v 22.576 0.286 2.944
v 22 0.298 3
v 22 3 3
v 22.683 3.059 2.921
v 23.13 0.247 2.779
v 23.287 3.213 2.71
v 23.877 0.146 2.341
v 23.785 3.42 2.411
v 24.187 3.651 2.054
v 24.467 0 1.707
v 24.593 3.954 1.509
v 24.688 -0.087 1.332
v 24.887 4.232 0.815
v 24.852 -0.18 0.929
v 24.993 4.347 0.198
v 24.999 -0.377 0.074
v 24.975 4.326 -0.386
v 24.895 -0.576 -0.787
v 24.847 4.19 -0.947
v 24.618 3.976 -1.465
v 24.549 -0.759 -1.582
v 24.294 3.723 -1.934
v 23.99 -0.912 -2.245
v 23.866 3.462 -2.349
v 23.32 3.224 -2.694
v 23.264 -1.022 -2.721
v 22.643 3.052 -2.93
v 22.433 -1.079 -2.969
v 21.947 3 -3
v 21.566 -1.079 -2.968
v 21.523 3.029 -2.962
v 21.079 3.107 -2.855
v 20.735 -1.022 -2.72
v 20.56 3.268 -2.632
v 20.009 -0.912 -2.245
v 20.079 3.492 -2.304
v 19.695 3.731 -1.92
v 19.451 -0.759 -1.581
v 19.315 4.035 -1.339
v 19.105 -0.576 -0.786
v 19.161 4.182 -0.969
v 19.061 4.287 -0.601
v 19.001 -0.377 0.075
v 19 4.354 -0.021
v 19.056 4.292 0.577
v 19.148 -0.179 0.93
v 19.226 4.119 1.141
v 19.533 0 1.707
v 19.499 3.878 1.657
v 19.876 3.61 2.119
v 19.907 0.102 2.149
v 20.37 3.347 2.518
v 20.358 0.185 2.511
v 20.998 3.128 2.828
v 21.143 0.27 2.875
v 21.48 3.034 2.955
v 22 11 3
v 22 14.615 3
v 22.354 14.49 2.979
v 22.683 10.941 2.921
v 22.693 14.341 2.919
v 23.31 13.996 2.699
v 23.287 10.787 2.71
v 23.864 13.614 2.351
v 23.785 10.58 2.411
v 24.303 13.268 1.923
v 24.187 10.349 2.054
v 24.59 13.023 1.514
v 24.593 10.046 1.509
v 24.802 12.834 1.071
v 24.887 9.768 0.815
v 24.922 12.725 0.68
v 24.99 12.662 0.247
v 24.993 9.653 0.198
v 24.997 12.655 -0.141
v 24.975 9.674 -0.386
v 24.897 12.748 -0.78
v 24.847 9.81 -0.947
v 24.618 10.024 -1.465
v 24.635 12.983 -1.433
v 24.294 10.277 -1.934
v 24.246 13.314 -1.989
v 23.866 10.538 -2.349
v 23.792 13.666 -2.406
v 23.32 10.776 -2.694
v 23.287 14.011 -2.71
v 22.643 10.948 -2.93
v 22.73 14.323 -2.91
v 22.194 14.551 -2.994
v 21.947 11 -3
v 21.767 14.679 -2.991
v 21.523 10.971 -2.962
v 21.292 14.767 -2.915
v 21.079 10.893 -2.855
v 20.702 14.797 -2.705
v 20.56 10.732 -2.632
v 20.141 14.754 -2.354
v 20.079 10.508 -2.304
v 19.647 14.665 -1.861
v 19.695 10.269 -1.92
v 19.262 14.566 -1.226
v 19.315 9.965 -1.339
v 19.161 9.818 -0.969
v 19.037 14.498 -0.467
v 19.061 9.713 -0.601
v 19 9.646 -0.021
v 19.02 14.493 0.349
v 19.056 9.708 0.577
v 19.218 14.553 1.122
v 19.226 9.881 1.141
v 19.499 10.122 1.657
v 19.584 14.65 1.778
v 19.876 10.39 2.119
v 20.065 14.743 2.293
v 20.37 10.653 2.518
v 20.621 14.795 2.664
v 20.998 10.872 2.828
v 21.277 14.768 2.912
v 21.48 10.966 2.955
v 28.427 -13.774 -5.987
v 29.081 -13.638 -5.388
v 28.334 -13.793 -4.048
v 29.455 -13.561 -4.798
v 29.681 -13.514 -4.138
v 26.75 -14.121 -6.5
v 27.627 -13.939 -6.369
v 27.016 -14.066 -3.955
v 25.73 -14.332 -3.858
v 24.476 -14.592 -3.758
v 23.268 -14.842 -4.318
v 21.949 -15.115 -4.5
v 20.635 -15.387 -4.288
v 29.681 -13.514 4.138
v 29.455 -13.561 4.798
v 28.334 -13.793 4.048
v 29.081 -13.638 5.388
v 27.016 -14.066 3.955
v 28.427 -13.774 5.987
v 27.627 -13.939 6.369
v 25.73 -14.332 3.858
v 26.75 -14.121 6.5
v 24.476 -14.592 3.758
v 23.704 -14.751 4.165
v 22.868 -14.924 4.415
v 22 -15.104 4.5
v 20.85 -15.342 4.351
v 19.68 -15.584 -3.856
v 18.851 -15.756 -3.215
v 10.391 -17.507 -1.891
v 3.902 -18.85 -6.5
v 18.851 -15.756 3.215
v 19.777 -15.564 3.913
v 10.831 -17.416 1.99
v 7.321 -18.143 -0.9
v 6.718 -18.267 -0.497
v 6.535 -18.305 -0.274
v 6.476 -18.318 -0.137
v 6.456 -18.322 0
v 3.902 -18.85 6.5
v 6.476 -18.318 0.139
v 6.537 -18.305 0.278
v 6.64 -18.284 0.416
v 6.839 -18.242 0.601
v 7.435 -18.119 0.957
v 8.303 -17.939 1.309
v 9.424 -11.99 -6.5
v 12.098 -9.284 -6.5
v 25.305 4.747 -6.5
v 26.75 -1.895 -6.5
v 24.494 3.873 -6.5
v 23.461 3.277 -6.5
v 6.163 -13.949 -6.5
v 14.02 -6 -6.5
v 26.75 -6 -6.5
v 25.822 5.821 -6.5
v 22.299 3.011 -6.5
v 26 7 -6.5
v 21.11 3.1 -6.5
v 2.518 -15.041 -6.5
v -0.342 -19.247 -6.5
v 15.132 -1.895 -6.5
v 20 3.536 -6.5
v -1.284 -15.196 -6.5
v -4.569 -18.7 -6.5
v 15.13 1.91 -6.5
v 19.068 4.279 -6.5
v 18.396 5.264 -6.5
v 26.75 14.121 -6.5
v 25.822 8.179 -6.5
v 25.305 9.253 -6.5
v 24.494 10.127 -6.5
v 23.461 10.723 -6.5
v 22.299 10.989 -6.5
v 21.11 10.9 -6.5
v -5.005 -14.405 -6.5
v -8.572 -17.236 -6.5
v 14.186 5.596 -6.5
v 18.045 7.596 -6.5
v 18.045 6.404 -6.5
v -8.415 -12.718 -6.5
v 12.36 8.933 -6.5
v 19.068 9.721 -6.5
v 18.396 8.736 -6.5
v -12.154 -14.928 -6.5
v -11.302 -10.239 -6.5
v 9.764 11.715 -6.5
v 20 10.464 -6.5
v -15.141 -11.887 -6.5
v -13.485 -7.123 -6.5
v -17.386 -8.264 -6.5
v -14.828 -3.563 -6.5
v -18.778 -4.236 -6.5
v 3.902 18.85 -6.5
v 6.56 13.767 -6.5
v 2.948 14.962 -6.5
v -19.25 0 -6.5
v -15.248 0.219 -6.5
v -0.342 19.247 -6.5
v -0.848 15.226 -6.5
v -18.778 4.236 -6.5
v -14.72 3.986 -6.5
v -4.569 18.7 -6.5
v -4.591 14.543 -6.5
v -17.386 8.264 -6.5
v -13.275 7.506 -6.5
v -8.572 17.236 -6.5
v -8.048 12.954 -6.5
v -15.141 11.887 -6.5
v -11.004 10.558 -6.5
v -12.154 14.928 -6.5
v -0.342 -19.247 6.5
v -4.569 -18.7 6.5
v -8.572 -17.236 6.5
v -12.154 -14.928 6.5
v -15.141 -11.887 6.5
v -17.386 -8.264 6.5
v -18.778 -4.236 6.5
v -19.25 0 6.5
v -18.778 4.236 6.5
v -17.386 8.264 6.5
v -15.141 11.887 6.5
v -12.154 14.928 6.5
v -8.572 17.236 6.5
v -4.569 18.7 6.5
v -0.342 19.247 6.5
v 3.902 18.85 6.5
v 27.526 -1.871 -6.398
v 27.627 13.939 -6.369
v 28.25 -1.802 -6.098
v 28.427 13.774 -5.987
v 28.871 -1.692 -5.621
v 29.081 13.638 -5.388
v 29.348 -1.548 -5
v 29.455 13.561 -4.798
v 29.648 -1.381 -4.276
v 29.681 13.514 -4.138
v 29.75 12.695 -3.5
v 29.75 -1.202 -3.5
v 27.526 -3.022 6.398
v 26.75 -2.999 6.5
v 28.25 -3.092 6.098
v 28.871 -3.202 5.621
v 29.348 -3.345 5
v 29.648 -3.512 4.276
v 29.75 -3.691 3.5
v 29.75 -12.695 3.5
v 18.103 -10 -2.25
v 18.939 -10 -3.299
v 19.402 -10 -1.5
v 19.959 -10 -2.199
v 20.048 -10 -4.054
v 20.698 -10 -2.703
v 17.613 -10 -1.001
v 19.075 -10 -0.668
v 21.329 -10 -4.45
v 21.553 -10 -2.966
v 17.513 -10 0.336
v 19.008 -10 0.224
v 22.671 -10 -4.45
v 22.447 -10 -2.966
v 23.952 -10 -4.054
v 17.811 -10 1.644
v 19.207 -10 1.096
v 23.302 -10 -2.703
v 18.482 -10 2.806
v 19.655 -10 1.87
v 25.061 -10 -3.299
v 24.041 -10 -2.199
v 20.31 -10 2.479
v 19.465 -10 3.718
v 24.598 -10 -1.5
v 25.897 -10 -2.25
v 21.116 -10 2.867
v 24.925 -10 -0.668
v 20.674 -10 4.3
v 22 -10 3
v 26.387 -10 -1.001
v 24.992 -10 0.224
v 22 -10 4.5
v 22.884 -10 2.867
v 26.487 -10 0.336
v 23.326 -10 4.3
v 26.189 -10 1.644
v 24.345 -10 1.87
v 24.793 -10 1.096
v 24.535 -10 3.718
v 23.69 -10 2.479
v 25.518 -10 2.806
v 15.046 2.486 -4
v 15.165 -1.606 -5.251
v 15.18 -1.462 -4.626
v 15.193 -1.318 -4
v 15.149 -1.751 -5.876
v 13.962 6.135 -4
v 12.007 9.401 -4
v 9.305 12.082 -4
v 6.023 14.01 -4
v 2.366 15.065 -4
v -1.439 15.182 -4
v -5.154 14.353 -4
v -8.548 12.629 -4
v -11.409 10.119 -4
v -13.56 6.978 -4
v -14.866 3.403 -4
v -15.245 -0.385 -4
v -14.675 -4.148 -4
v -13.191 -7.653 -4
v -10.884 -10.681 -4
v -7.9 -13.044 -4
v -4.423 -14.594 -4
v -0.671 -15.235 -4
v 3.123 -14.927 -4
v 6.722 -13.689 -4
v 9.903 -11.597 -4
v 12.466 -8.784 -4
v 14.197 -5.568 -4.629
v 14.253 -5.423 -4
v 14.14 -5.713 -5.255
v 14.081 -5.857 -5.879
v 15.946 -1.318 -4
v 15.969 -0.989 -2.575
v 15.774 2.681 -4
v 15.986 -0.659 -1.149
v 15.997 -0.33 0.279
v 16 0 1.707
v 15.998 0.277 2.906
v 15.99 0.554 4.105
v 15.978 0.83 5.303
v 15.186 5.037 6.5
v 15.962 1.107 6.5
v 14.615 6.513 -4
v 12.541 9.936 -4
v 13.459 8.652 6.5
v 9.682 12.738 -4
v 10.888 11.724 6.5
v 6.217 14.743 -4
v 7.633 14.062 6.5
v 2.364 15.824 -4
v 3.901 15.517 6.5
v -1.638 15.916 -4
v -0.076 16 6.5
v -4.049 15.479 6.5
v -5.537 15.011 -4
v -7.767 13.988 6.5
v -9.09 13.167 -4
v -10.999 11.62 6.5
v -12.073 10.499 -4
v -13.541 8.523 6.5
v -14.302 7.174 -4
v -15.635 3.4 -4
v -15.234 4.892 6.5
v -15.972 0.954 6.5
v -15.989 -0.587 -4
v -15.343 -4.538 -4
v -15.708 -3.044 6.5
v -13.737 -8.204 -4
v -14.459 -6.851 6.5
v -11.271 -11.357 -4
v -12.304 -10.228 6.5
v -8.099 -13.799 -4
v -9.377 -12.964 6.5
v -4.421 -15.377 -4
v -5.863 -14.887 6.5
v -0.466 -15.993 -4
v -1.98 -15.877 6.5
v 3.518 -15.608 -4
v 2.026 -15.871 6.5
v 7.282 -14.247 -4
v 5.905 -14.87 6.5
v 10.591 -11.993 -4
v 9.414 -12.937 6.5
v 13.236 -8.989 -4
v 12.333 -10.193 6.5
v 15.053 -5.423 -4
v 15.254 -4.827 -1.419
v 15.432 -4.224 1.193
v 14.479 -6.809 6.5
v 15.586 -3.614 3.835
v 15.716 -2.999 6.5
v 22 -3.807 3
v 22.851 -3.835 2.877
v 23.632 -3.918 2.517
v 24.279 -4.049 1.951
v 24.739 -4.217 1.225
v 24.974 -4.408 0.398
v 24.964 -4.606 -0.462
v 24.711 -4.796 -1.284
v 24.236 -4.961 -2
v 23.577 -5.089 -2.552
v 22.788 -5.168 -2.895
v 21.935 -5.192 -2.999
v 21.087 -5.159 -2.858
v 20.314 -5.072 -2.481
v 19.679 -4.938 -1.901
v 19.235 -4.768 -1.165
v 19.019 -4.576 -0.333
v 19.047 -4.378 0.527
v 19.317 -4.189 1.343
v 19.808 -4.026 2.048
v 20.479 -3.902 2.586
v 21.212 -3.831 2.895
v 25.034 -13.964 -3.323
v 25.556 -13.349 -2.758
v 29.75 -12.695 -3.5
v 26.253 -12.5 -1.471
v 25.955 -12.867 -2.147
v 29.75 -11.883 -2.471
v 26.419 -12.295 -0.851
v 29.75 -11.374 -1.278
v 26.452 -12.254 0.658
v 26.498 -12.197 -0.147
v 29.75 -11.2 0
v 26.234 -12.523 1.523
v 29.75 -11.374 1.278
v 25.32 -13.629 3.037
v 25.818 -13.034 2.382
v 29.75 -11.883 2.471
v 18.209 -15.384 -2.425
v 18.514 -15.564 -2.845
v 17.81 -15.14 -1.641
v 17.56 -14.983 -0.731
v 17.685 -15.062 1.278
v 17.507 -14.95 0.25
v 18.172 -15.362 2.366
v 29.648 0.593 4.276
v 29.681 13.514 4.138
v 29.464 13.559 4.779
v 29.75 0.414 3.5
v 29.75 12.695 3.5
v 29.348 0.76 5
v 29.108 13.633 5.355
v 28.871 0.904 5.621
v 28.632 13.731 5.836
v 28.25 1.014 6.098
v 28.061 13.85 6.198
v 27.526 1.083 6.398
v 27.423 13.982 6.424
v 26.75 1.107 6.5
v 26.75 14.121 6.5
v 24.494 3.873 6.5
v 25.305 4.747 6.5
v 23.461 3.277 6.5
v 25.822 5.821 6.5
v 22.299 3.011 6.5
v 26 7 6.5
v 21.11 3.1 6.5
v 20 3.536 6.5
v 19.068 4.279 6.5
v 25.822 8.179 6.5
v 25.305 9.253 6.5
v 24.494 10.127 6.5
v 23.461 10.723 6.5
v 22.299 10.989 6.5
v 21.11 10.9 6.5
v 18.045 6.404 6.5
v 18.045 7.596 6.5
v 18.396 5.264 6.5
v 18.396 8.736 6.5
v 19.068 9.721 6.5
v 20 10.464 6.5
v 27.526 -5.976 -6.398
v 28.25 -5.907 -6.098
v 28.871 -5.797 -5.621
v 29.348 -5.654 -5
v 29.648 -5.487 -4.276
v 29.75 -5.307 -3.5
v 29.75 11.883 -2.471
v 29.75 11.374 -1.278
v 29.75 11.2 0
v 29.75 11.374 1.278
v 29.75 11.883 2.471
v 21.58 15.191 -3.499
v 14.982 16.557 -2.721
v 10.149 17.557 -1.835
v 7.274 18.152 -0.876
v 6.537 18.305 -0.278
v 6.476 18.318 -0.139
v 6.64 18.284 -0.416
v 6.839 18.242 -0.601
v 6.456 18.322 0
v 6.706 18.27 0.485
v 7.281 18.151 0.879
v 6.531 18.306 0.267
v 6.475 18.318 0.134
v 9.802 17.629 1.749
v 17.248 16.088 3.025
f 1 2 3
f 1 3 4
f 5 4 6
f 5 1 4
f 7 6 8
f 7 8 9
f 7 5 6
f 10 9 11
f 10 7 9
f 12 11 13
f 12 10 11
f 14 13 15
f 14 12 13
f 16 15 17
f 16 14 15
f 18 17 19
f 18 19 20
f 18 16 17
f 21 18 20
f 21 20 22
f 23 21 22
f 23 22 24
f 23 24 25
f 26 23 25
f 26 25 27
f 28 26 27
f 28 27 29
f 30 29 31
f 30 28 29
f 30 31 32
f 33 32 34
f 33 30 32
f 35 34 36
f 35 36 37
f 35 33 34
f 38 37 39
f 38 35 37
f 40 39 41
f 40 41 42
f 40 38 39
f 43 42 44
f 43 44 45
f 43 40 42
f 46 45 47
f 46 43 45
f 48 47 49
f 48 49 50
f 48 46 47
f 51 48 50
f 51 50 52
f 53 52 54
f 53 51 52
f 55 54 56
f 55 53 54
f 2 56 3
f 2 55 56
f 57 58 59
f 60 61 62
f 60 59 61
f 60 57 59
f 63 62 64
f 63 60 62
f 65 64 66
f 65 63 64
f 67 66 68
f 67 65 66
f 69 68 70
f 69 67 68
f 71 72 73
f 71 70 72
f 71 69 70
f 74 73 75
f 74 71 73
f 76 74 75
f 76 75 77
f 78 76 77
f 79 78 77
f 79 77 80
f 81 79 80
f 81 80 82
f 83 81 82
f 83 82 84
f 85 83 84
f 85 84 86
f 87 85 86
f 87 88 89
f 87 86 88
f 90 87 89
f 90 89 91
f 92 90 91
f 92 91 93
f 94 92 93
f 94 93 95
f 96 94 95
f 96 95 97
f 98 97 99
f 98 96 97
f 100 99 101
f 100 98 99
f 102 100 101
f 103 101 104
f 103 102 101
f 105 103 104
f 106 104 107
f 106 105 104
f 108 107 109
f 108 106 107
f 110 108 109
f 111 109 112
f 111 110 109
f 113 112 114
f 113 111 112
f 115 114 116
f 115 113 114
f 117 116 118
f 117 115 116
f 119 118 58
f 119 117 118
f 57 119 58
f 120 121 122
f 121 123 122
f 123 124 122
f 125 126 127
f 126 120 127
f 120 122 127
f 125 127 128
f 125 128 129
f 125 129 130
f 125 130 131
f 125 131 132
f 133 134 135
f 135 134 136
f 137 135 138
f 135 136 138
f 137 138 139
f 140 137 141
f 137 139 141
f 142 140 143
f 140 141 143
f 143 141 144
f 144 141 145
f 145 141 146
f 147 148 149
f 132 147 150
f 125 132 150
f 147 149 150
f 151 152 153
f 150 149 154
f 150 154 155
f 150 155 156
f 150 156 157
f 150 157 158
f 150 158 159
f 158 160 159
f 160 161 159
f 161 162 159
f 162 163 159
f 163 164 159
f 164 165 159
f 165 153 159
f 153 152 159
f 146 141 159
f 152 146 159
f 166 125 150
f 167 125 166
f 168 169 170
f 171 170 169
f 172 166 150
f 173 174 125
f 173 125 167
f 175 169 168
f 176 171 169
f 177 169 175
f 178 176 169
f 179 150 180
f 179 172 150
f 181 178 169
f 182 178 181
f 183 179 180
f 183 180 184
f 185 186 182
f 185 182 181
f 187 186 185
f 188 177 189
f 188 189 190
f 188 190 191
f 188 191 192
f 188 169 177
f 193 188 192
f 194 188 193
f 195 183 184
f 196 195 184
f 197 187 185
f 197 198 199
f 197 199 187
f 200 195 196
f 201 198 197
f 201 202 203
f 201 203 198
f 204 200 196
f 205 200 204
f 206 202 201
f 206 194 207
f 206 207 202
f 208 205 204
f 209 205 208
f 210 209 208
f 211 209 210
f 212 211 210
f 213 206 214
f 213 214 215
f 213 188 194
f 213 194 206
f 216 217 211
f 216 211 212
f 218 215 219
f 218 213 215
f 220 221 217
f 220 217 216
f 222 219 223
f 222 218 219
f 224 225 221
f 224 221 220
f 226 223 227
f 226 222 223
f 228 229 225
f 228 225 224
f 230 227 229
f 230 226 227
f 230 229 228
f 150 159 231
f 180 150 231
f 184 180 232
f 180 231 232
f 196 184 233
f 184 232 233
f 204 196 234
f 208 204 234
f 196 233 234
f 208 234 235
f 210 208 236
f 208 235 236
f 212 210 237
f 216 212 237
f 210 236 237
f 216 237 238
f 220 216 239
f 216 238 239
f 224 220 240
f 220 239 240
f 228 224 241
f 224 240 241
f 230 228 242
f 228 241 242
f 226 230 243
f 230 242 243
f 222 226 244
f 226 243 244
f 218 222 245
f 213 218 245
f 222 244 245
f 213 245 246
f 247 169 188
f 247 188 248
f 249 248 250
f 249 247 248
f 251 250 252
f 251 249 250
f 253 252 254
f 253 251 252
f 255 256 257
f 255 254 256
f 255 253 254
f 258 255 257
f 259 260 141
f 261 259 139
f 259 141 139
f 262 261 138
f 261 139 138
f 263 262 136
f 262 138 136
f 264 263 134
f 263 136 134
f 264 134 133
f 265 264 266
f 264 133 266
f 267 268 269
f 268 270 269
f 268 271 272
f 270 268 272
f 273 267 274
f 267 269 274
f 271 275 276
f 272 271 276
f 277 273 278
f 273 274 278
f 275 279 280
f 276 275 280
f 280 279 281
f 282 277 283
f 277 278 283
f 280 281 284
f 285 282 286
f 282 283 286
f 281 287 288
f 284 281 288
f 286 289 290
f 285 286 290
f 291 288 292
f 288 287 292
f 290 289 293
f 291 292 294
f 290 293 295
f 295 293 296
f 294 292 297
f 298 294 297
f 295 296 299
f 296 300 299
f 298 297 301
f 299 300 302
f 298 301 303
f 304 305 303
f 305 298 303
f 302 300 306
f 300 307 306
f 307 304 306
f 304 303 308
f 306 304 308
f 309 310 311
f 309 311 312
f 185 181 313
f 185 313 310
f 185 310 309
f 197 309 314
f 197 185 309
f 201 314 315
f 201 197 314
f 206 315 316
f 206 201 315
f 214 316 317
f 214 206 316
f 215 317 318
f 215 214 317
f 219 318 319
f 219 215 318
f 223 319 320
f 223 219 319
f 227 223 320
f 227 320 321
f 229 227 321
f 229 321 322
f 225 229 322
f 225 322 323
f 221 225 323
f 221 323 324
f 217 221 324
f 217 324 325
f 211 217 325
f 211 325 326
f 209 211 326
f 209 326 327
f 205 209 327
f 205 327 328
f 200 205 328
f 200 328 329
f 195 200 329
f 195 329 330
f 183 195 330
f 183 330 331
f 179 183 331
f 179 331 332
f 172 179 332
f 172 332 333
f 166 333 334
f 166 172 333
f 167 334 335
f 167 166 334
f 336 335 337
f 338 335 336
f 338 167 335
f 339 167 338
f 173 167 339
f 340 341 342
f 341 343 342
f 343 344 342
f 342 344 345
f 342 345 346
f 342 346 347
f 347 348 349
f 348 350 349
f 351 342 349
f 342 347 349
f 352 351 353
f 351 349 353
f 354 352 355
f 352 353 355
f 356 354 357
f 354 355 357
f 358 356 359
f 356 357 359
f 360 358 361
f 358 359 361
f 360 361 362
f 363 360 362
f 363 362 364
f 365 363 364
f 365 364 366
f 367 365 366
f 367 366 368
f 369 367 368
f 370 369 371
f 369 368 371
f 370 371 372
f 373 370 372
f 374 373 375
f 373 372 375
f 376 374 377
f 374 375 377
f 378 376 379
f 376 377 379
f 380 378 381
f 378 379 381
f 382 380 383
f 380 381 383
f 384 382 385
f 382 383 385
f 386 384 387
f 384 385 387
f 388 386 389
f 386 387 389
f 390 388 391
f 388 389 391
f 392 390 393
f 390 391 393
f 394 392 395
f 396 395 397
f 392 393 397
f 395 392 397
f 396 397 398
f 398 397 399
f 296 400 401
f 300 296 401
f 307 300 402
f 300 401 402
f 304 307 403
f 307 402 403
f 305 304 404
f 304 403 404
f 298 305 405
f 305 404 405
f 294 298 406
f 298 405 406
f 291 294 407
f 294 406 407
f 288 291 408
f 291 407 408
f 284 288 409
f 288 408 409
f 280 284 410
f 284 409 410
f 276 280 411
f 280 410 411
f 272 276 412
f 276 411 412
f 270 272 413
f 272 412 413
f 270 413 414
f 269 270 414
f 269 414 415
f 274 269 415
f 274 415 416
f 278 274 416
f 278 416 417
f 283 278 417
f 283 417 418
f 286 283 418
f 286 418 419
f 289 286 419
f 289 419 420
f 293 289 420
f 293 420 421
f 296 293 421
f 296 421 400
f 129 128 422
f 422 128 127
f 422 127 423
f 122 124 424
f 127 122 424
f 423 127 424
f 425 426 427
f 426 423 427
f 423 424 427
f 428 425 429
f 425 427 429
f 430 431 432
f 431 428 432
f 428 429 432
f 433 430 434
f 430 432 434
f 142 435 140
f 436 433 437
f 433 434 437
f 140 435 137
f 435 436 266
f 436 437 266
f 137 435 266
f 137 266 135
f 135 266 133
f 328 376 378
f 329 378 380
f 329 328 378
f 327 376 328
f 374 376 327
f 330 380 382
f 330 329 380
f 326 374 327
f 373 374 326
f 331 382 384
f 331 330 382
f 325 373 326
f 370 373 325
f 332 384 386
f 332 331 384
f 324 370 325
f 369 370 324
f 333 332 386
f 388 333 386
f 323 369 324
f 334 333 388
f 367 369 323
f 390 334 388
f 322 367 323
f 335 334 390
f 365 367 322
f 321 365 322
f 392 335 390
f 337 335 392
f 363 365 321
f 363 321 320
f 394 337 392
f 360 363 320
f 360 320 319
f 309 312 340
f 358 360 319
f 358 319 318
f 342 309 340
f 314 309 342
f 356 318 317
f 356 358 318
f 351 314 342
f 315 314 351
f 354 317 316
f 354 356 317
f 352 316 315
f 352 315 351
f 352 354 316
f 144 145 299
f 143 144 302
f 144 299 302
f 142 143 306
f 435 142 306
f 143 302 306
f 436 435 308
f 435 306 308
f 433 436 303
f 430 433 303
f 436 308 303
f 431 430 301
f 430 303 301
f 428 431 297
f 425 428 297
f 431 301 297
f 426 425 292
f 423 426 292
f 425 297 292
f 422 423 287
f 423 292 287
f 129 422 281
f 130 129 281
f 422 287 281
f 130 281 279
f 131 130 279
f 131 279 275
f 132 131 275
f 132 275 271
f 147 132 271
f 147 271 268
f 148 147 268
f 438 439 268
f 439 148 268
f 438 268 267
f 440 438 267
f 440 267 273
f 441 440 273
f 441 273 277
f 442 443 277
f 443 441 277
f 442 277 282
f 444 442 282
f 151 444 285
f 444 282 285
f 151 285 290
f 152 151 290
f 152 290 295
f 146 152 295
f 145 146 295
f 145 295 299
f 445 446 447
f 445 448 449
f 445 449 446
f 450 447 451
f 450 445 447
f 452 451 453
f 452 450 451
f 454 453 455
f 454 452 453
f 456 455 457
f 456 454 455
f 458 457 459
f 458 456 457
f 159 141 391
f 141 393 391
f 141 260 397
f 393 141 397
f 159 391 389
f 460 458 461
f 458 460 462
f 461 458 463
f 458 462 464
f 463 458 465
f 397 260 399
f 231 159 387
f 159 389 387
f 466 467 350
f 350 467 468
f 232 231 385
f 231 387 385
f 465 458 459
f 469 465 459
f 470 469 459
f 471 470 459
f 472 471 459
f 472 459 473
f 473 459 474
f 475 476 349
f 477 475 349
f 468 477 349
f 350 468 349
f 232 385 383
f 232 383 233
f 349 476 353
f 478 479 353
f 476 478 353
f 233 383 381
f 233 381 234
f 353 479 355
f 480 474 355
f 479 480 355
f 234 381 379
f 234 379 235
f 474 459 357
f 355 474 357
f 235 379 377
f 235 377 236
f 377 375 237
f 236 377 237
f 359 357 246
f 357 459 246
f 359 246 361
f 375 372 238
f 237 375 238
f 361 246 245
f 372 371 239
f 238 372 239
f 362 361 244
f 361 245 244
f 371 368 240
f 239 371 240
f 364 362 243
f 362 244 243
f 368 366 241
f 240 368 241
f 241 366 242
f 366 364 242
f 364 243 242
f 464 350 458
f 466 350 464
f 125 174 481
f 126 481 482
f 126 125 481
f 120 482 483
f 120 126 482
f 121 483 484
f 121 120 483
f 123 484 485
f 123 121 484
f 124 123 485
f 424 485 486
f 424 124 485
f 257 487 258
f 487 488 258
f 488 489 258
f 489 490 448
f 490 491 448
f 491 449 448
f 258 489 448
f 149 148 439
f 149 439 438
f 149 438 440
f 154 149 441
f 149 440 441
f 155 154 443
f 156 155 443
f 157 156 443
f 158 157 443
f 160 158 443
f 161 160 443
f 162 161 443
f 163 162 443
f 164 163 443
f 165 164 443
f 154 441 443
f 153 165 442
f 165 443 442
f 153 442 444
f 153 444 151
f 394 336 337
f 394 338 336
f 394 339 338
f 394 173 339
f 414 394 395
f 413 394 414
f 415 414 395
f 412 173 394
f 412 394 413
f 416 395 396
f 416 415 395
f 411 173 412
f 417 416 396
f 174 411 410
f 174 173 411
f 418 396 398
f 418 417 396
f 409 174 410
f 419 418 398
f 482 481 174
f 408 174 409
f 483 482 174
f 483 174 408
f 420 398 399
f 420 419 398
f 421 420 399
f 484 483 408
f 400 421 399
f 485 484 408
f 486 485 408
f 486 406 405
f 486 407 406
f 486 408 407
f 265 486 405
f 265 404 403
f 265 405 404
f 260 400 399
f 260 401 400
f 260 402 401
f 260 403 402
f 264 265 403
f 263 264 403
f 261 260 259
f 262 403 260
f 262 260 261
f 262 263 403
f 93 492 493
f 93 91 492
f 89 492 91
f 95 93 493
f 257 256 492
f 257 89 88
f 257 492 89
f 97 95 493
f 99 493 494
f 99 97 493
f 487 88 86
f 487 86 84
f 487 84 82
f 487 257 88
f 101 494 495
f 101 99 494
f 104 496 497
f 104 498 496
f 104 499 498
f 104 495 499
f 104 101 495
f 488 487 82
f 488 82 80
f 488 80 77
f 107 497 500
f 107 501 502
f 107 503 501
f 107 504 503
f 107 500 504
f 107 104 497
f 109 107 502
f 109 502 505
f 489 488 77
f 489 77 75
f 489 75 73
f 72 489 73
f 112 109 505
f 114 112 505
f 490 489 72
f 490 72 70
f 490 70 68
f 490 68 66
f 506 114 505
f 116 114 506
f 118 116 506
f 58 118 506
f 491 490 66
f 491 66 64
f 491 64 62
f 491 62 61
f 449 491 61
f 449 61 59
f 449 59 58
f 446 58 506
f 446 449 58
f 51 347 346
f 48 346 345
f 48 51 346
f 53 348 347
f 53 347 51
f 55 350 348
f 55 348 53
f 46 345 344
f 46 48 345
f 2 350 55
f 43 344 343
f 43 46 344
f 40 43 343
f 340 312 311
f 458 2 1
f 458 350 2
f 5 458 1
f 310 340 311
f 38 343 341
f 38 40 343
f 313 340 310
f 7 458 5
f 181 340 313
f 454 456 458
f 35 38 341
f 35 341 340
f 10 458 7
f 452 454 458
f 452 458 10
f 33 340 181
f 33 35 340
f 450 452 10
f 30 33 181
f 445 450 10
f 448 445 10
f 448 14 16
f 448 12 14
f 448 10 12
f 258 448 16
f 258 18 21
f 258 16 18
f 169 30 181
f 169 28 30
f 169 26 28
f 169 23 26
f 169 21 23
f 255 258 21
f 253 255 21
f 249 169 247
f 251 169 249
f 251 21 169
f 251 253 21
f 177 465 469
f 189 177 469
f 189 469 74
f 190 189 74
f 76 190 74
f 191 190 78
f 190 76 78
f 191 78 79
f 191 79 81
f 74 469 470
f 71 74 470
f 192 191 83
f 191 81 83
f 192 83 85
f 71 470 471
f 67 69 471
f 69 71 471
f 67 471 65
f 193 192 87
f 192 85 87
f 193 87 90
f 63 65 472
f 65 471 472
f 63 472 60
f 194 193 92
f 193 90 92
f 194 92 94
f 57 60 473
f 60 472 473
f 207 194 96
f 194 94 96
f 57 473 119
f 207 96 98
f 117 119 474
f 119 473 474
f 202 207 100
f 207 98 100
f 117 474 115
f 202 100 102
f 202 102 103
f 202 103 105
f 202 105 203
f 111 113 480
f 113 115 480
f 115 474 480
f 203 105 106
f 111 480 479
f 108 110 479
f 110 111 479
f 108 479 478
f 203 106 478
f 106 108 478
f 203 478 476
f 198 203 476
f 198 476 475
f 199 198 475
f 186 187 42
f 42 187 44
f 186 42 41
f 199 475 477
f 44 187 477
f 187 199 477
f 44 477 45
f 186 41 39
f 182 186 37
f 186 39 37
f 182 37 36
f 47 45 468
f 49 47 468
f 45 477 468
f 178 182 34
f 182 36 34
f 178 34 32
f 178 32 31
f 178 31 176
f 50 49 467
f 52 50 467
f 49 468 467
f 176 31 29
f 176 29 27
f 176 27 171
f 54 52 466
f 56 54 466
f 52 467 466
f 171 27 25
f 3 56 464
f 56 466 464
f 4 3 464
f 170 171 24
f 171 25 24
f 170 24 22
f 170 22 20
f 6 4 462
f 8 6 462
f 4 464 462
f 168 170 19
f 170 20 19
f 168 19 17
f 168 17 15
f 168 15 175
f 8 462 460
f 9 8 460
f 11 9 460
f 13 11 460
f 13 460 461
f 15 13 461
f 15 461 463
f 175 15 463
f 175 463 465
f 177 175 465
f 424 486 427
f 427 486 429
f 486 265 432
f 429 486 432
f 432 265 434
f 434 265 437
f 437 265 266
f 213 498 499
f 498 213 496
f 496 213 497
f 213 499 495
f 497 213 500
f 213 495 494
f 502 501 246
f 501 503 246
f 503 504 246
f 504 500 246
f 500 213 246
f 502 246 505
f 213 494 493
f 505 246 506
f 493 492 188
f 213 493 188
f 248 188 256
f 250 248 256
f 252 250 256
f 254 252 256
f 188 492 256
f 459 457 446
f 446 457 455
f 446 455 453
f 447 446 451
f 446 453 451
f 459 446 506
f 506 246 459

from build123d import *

# Parameters (mm, degrees)
ESQUISSE1_R                  = 15.25
EXTRUSION1_DEPTH             = 6.5
ESQUISSE2_R                  = 16
ENL_V_MAT_EXTRU_1_DEPTH      = 10.5
ENL_V_MAT_EXTRU_2_REACH      = 51
ESQUISSE4_R                  = 4
ENL_V_MAT_EXTRU_3_DEPTH      = 14
CONG_2_R                     = 3
ESQUISSE5_R                  = 3
ENL_V_MAT_EXTRU_4_DEPTH      = 20.25
ENL_V_MAT_EXTRU_4_DEPTH_BACK = 20.25
ENL_V_START                  = -10
ESQUISSE6_R                  = 4.5
ENL_V_MAT_EXTRU_5_DEPTH      = 10.25


with BuildPart() as part:
    # Esquisse1 → Extrusion1 (new body, symmetric)
    with BuildSketch(Plane.XY):
        with BuildLine():
            Line((3.901920053, 18.850398402), (29.75, 13.5))
            Line((29.75, 13.5), (29.75, -13.5))
            Line((29.75, -13.5), (3.901920053, -18.850398402))
            ThreePointArc((3.901920053, -18.850398402), (-19.25, 0), (3.901920053, 18.850398402))
        make_face()
        Circle(ESQUISSE1_R, mode=Mode.SUBTRACT)
    extrude(amount=EXTRUSION1_DEPTH, both=True)

    # Esquisse2 → Enlèv. mat.-Extru.1 (cut)
    with BuildSketch(Plane.XY.offset(6.5)):
        Circle(ESQUISSE2_R)
    extrude(amount=-ENL_V_MAT_EXTRU_1_DEPTH, mode=Mode.SUBTRACT)

    # Esquisse3 → Enlèv. mat.-Extru.2 (cut, up to next)
    with BuildSketch(Plane(origin=(29.75, 0, 0), x_dir=(0, 0, -1), z_dir=(1, 0, 0)), mode=Mode.PRIVATE) as enl_v_mat_extru_2_sk1:
        Polygon((6.5, -6), (-6.5, -2.998713515), (-6.5, 1.106502916), (6.5, -1.894783569), align=None)
    enl_v_mat_extru_2_tool1 = extrude(enl_v_mat_extru_2_sk1.sketch, amount=-ENL_V_MAT_EXTRU_2_REACH, mode=Mode.PRIVATE) & part.part
    add(enl_v_mat_extru_2_tool1.solids().sort_by_distance((29.75, -2.446749, 0))[0], mode=Mode.SUBTRACT)

    # Esquisse4 → Enlèv. mat.-Extru.3 (cut, through all)
    with BuildSketch(Plane.XY.offset(6.5)):
        with Locations((22, 7)):
            Circle(ESQUISSE4_R)
    extrude(amount=-ENL_V_MAT_EXTRU_3_DEPTH, mode=Mode.SUBTRACT)

    # Congé2
    cong_2_edges = [part.edges().sort_by_distance(p)[0] for p in [
        (29.75, -8.249356758, 6.5),
        (29.75, 5.802608216, -6.5),
        (29.75, 7.303251458, 6.5),
        (29.75, -9.75, -6.5),
    ]]
    fillet(cong_2_edges, radius=CONG_2_R)

    # Esquisse5 → Enlèv. mat.-Extru.4 (cut, two sides)
    with BuildSketch(Plane(origin=(0, 0, 0), x_dir=(1, 0, 0), z_dir=(0, 1, 0))) as enl_v_mat_extru_4_sk:
        with Locations(Location((22, 0, 0), (0, 0, 270))):  # turned: the seam where the file's is
            Circle(ESQUISSE5_R)
    extrude(amount=ENL_V_MAT_EXTRU_4_DEPTH, mode=Mode.SUBTRACT)
    extrude(enl_v_mat_extru_4_sk.sketch, amount=-ENL_V_MAT_EXTRU_4_DEPTH_BACK, mode=Mode.SUBTRACT)

    # Esquisse6 → Enlèv. mat.-Extru.5 (cut, through all)
    with BuildSketch(Plane(origin=(0, 0, 0), x_dir=(1, 0, 0), z_dir=(0, 1, 0)).offset(ENL_V_START)):
        with Locations(Location((22, 0, 0), (0, 0, 270))):  # turned: the seam where the file's is
            Circle(ESQUISSE6_R)
    extrude(amount=-ENL_V_MAT_EXTRU_5_DEPTH, mode=Mode.SUBTRACT)

    # Esquisse7 → Enlèvement de matière-Révolution1 (revolve, cut)
    with BuildSketch(Plane.XY):
        Polygon((7.917568964, -23.103302801), (6.45571044, -18.321779021), (29.75, -11.2), (31.211858524, -15.98152378), align=None)
    enl_vement_de_mati_re_r_volution1 = revolve(axis=Axis((-29.68487649, -34.599524074, 0), (0.956304756, 0.292371705, 0)), mode=Mode.SUBTRACT)

    # Symétrie1: Enlèvement de matière-Révolution1 across plane
    add(enl_vement_de_mati_re_r_volution1.mirror(Plane.ZX), mode=Mode.SUBTRACT)


solid = part.part
